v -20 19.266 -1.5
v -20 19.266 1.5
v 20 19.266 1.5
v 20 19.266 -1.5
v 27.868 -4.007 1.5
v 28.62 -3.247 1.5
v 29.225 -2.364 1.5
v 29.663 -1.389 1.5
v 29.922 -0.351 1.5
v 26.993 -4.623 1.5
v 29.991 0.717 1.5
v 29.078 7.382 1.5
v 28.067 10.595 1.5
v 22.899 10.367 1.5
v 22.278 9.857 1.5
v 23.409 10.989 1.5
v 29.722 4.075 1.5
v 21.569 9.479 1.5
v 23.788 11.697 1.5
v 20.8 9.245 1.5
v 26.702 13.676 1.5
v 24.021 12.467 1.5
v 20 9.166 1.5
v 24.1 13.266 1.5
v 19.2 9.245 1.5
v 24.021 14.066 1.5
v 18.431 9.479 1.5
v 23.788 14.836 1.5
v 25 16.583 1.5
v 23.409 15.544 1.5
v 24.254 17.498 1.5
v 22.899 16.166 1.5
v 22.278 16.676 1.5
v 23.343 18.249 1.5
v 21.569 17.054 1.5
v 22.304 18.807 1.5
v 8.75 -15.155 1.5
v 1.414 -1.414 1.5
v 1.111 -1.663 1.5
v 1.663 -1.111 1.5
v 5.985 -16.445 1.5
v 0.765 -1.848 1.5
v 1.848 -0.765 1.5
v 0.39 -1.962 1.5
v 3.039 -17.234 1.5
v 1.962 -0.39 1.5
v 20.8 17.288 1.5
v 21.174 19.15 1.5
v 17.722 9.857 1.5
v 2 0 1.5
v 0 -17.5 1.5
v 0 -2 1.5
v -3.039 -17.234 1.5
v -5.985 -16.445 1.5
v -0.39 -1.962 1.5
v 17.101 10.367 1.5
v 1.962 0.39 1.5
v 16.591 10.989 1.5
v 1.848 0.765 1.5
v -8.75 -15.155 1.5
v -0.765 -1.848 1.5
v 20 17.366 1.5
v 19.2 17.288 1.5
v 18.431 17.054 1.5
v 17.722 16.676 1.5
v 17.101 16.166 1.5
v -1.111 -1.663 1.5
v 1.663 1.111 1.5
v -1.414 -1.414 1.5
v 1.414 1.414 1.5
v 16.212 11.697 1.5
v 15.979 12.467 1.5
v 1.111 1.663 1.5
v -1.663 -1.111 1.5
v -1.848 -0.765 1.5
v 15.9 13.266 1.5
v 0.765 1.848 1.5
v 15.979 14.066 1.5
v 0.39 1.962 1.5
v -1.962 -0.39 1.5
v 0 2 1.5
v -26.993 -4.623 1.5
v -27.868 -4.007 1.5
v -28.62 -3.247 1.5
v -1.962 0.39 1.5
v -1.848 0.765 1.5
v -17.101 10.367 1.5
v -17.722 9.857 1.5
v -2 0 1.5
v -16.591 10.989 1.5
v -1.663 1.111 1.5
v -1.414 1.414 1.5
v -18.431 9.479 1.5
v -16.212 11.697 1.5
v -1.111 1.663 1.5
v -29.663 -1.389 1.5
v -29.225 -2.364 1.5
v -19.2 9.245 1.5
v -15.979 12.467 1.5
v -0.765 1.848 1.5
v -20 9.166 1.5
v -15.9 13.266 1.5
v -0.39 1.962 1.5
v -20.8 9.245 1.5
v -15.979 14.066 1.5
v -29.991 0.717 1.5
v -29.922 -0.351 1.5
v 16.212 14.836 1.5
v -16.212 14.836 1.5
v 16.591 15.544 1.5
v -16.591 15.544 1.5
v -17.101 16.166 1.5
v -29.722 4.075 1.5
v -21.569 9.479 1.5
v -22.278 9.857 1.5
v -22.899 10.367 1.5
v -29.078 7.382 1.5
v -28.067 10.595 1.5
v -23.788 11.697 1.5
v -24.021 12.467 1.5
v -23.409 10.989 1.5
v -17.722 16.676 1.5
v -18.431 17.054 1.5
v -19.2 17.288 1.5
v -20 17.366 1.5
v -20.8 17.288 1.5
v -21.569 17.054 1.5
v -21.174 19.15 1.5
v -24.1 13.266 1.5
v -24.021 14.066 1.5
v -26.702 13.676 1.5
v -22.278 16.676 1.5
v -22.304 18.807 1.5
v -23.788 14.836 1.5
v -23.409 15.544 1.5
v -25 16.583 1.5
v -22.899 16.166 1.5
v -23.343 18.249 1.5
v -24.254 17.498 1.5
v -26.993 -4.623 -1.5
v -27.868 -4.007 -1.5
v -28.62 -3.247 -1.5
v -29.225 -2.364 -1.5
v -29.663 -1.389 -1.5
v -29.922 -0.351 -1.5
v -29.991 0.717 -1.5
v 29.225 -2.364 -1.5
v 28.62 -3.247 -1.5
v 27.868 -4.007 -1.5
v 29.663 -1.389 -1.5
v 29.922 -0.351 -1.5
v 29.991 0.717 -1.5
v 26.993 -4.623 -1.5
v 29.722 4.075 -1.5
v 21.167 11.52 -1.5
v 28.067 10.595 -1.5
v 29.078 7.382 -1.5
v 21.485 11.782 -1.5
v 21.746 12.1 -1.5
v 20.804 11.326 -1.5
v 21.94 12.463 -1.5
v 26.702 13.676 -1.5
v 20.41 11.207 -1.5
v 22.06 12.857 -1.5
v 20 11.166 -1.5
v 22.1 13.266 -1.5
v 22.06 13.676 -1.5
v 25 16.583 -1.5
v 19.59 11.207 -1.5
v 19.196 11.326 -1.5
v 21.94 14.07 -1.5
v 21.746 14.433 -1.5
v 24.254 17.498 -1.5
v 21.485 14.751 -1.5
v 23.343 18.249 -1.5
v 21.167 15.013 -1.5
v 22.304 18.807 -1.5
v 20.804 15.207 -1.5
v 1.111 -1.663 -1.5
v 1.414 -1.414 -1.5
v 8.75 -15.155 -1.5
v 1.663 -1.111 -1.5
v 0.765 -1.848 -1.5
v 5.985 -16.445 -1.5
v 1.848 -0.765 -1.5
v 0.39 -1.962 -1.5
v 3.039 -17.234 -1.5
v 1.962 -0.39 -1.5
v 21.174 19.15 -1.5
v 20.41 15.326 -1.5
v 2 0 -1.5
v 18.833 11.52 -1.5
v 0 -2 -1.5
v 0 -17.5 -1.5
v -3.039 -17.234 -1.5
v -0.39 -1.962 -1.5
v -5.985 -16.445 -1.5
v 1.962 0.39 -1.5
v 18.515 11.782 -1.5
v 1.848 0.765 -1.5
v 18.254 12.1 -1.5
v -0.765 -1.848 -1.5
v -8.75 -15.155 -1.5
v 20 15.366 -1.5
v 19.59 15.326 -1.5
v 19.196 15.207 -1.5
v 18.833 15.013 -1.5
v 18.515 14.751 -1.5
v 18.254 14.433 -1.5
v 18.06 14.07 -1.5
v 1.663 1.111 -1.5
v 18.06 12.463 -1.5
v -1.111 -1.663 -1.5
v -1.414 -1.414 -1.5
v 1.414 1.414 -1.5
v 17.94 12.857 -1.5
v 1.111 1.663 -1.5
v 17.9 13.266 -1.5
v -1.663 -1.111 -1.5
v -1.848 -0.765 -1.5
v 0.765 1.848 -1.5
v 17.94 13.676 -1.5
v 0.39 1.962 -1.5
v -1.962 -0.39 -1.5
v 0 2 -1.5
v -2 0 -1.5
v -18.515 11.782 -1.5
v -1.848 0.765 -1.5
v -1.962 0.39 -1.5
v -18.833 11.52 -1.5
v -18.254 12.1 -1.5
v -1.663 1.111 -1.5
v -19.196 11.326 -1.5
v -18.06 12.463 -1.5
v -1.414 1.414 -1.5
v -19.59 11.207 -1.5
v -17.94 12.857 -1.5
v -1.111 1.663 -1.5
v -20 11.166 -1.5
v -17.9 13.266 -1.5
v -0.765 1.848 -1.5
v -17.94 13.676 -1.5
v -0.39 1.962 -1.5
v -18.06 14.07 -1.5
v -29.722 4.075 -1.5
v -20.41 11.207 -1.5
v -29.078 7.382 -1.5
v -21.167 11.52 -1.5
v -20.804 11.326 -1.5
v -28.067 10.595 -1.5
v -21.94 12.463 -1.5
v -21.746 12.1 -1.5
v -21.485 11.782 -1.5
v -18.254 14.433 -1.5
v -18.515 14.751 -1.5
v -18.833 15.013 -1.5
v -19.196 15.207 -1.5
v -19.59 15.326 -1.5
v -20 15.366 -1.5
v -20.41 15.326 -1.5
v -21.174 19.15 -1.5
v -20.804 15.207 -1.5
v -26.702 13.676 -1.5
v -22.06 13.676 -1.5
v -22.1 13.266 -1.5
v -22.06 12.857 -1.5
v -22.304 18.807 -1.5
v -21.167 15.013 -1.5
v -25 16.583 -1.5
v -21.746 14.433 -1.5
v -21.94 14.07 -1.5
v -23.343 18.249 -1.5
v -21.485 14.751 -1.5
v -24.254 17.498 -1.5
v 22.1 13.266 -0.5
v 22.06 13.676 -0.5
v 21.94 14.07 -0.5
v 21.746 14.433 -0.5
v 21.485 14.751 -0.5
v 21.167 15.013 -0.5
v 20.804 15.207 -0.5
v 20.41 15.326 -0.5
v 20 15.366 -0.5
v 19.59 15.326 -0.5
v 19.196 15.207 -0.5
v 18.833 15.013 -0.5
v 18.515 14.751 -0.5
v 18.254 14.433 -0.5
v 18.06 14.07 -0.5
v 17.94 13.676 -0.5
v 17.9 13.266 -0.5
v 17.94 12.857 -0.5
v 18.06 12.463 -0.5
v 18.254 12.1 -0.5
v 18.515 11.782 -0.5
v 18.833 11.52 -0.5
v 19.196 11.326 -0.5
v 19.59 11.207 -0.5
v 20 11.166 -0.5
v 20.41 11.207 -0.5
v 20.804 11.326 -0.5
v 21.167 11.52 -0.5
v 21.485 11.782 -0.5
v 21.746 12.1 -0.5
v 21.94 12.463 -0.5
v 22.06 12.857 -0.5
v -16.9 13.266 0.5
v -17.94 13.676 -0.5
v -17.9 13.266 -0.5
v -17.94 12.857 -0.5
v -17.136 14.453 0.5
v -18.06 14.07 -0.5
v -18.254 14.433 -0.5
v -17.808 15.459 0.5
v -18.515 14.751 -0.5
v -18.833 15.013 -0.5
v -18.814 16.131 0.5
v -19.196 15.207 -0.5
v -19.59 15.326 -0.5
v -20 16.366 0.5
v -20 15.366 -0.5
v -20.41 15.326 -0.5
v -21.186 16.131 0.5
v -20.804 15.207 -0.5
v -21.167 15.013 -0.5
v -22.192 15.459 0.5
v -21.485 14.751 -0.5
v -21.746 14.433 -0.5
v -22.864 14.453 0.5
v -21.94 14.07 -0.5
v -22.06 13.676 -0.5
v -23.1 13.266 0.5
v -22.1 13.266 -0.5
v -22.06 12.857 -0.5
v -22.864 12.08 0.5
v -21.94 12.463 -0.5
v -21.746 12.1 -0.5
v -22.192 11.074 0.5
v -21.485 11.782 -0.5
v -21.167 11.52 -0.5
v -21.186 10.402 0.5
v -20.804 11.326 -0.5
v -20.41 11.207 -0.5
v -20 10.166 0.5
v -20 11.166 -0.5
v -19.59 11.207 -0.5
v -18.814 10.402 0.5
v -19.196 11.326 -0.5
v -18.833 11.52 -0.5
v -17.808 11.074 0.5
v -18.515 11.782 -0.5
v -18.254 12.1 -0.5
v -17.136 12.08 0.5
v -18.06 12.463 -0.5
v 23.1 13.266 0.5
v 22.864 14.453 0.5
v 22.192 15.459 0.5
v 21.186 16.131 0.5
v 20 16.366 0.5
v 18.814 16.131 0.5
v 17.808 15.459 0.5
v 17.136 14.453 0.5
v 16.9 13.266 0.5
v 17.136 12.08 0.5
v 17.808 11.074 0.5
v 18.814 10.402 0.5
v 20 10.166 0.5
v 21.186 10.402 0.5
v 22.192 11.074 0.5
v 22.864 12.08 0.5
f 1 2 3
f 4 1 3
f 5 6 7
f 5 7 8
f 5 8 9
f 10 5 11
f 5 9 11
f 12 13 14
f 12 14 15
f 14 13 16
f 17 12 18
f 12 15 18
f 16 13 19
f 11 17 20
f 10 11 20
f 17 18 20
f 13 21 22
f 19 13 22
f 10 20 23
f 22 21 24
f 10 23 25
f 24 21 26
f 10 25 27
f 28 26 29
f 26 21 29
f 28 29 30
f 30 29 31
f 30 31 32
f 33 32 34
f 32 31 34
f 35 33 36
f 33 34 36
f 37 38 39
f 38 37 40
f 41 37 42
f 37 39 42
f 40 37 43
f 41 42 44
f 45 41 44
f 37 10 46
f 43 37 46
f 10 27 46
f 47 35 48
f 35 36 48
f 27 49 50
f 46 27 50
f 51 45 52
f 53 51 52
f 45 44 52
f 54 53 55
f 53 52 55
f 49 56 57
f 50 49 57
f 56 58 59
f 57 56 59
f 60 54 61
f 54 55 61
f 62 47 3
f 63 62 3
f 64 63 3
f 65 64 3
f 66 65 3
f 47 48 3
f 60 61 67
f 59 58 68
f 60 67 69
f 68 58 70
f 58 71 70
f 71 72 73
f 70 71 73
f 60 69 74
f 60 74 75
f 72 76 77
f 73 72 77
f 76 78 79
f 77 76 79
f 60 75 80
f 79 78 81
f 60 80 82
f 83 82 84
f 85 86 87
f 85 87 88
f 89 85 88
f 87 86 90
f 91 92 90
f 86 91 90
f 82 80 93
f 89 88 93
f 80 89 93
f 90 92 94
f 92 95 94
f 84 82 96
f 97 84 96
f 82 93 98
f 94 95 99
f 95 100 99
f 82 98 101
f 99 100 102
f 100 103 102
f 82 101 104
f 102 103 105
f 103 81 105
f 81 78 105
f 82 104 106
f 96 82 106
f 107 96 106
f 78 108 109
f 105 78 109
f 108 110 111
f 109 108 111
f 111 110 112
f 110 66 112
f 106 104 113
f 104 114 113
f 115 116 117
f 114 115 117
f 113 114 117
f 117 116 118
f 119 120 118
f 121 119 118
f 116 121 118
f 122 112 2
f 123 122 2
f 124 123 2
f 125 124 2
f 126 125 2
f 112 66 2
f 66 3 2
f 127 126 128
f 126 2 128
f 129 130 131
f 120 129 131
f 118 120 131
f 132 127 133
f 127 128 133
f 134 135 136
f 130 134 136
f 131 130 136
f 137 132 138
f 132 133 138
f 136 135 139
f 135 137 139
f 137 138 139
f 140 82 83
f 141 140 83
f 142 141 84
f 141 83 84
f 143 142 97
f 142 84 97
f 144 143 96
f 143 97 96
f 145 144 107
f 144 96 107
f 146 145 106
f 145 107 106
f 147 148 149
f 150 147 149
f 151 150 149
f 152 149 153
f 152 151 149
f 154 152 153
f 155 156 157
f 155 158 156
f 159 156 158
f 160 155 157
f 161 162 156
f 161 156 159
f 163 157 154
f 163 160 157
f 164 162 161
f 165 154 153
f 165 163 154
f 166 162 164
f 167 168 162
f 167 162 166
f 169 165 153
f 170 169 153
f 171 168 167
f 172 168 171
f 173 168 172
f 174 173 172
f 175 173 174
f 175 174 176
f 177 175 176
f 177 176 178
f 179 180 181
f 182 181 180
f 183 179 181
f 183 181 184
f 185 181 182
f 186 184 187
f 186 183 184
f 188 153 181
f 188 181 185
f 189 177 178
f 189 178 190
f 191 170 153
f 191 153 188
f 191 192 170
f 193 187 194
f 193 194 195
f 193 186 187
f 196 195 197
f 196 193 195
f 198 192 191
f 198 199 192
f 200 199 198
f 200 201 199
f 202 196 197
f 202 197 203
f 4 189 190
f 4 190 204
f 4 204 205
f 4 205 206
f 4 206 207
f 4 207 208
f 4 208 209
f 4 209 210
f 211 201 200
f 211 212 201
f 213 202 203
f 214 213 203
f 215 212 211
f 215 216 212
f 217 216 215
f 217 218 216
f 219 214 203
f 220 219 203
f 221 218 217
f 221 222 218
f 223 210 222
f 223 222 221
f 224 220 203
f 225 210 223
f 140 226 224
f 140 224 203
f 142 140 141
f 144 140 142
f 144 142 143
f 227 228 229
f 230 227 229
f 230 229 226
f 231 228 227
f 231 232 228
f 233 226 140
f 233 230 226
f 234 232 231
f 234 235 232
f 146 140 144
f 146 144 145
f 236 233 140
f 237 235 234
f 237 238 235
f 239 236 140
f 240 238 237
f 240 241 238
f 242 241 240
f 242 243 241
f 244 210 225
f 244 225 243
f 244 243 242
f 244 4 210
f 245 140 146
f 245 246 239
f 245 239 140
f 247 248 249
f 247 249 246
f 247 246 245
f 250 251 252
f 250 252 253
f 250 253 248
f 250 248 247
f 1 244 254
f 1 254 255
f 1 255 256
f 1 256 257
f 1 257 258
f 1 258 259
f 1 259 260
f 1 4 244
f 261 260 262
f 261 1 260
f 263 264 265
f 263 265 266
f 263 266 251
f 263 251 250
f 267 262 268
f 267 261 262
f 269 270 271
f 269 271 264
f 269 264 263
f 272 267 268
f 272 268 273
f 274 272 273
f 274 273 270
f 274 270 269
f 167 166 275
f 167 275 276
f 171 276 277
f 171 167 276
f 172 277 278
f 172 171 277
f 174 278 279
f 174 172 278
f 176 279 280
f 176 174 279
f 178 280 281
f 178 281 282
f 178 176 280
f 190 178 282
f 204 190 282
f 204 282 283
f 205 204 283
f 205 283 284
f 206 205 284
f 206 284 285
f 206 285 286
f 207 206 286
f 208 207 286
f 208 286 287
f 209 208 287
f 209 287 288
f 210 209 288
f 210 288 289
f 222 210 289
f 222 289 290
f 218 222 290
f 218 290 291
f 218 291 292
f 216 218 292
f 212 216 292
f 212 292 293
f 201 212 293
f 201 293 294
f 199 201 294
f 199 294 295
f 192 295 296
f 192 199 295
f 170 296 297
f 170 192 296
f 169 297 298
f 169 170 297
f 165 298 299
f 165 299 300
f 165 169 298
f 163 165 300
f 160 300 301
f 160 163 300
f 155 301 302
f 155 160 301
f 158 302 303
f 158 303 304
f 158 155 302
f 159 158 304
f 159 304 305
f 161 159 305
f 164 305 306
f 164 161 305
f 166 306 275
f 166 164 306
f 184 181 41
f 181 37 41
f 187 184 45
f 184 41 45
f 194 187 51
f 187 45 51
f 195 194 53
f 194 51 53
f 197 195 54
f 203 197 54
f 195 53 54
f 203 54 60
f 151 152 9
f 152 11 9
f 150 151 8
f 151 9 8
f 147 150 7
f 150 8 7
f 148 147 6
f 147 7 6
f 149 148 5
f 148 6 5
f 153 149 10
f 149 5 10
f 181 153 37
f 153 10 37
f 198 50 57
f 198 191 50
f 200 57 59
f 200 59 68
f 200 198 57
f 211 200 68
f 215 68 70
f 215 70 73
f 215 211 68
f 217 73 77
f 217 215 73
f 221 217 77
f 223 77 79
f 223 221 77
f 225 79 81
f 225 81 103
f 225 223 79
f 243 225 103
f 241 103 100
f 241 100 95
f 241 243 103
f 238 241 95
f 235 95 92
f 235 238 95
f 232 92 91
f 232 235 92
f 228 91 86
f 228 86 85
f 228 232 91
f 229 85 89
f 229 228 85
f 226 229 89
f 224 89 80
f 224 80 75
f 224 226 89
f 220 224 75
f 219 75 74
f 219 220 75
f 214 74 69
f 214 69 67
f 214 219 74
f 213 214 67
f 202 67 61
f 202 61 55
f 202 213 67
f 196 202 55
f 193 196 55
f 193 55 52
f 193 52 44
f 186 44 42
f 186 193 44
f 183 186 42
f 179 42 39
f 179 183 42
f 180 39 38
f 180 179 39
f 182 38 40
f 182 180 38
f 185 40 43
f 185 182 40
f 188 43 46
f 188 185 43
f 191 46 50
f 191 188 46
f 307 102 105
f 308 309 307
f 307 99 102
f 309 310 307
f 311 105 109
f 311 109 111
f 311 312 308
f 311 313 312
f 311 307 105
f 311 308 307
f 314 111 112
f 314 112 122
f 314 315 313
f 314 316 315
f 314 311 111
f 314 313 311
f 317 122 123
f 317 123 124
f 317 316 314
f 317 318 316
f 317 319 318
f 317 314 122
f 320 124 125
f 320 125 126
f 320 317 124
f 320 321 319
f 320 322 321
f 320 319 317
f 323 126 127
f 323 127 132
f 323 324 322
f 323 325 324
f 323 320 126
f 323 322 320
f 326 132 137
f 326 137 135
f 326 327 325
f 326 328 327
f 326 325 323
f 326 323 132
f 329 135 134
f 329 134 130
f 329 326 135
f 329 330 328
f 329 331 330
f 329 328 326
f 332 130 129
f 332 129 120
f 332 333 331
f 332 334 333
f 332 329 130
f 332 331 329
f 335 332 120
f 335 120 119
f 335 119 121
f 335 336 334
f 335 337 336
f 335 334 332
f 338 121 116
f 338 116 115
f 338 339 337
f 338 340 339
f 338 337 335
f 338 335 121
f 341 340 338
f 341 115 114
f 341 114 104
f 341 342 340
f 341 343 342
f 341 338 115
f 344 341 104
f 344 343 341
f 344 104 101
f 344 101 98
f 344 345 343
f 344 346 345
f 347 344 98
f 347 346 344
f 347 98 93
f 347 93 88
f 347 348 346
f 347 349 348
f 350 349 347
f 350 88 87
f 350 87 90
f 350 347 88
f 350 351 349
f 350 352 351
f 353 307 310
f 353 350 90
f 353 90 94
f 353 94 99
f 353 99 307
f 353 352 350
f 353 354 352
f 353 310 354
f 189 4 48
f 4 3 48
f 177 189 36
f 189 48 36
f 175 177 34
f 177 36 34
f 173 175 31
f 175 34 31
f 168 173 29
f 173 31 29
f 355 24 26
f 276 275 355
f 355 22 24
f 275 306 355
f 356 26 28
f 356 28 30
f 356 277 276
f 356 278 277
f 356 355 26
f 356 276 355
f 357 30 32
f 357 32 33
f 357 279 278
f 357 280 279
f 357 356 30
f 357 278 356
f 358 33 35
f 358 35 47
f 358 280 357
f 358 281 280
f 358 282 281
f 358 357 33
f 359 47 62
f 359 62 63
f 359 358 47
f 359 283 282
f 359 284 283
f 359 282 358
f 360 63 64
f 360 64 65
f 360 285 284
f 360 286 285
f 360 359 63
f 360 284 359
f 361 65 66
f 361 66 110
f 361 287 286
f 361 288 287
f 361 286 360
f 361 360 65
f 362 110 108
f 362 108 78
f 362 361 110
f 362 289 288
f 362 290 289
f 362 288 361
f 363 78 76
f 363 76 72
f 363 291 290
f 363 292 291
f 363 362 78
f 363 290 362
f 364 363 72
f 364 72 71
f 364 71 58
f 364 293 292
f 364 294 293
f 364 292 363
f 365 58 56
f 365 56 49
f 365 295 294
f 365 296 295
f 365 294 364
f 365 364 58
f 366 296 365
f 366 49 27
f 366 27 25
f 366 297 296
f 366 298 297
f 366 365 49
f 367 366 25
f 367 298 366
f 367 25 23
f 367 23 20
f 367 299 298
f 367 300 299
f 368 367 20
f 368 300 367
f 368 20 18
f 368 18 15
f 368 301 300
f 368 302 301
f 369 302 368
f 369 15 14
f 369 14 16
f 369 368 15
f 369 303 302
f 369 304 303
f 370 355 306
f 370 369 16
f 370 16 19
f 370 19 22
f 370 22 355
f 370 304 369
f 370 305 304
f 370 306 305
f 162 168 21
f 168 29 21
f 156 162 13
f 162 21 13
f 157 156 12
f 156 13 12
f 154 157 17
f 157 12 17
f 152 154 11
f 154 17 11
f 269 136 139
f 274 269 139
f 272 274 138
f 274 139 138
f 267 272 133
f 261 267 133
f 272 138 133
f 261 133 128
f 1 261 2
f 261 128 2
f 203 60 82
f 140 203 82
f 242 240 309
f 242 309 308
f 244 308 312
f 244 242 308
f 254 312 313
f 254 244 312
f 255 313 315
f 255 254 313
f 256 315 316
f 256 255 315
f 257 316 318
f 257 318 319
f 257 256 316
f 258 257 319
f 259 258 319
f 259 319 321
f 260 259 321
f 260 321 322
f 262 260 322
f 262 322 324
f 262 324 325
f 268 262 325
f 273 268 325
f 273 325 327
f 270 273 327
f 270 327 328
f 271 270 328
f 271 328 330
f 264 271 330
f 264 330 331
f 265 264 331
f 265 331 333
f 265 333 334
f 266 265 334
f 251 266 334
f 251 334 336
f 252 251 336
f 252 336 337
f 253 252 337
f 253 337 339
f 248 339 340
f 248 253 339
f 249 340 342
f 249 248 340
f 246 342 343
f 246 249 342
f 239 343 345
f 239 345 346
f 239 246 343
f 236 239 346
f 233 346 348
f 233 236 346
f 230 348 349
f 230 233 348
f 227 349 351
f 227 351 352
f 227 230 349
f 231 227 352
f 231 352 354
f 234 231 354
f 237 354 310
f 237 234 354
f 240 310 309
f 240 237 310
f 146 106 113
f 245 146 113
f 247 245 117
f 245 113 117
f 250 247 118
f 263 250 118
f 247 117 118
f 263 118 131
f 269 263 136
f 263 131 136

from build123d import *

# Parameters (mm, degrees)
SKETCH_1_R      = 2.1
SKETCH_1_R_2    = 2
EXTRUDE_1_DEPTH = 1.5
CHAMFER_1_SIZE  = 2


with BuildPart() as part:
    # 草图1 → 凸台-拉伸1 (new, symmetric)
    with BuildSketch(Plane.XY):
        with BuildLine():
            Line((-20, 19.266499161), (20, 19.266499161))
            ThreePointArc((20, 19.266499161), (22.837274331, 18.553263235), (25, 16.583123952))
            ThreePointArc((25, 16.583123952), (28.617303042, 9.002775495), (29.991436749, 0.716743841))
            ThreePointArc((29.991436749, 0.716743841), (29.224770759, -2.364314571), (26.993149399, -4.62275735))
            Line((26.993149399, -4.62275735), (8.75, -15.155444566))
            ThreePointArc((8.75, -15.155444566), (0, -17.5), (-8.75, -15.155444566))
            Line((-8.75, -15.155444566), (-26.993149399, -4.62275735))
            ThreePointArc((-26.993149399, -4.62275735), (-29.224770759, -2.364314571), (-29.991436749, 0.716743841))
            ThreePointArc((-29.991436749, 0.716743841), (-28.617303042, 9.002775495), (-25, 16.583123952))
            ThreePointArc((-25, 16.583123952), (-22.837274331, 18.553263235), (-20, 19.266499161))
        make_face()
        with Locations((-20, 13.266499161)):
            Circle(SKETCH_1_R, mode=Mode.SUBTRACT)
        with Locations((20, 13.266499161)):
            Circle(SKETCH_1_R, mode=Mode.SUBTRACT)
        Circle(SKETCH_1_R_2, mode=Mode.SUBTRACT)
    extrude(amount=EXTRUDE_1_DEPTH, both=True)

    # 倒角1
    chamfer_1_edges = [part.edges().sort_by_distance(p)[0] for p in [
        (-22.1, 13.266499161, 1.5),
        (17.9, 13.266499161, 1.5),
    ]]
    chamfer(chamfer_1_edges, length=CHAMFER_1_SIZE)


solid = part.part
